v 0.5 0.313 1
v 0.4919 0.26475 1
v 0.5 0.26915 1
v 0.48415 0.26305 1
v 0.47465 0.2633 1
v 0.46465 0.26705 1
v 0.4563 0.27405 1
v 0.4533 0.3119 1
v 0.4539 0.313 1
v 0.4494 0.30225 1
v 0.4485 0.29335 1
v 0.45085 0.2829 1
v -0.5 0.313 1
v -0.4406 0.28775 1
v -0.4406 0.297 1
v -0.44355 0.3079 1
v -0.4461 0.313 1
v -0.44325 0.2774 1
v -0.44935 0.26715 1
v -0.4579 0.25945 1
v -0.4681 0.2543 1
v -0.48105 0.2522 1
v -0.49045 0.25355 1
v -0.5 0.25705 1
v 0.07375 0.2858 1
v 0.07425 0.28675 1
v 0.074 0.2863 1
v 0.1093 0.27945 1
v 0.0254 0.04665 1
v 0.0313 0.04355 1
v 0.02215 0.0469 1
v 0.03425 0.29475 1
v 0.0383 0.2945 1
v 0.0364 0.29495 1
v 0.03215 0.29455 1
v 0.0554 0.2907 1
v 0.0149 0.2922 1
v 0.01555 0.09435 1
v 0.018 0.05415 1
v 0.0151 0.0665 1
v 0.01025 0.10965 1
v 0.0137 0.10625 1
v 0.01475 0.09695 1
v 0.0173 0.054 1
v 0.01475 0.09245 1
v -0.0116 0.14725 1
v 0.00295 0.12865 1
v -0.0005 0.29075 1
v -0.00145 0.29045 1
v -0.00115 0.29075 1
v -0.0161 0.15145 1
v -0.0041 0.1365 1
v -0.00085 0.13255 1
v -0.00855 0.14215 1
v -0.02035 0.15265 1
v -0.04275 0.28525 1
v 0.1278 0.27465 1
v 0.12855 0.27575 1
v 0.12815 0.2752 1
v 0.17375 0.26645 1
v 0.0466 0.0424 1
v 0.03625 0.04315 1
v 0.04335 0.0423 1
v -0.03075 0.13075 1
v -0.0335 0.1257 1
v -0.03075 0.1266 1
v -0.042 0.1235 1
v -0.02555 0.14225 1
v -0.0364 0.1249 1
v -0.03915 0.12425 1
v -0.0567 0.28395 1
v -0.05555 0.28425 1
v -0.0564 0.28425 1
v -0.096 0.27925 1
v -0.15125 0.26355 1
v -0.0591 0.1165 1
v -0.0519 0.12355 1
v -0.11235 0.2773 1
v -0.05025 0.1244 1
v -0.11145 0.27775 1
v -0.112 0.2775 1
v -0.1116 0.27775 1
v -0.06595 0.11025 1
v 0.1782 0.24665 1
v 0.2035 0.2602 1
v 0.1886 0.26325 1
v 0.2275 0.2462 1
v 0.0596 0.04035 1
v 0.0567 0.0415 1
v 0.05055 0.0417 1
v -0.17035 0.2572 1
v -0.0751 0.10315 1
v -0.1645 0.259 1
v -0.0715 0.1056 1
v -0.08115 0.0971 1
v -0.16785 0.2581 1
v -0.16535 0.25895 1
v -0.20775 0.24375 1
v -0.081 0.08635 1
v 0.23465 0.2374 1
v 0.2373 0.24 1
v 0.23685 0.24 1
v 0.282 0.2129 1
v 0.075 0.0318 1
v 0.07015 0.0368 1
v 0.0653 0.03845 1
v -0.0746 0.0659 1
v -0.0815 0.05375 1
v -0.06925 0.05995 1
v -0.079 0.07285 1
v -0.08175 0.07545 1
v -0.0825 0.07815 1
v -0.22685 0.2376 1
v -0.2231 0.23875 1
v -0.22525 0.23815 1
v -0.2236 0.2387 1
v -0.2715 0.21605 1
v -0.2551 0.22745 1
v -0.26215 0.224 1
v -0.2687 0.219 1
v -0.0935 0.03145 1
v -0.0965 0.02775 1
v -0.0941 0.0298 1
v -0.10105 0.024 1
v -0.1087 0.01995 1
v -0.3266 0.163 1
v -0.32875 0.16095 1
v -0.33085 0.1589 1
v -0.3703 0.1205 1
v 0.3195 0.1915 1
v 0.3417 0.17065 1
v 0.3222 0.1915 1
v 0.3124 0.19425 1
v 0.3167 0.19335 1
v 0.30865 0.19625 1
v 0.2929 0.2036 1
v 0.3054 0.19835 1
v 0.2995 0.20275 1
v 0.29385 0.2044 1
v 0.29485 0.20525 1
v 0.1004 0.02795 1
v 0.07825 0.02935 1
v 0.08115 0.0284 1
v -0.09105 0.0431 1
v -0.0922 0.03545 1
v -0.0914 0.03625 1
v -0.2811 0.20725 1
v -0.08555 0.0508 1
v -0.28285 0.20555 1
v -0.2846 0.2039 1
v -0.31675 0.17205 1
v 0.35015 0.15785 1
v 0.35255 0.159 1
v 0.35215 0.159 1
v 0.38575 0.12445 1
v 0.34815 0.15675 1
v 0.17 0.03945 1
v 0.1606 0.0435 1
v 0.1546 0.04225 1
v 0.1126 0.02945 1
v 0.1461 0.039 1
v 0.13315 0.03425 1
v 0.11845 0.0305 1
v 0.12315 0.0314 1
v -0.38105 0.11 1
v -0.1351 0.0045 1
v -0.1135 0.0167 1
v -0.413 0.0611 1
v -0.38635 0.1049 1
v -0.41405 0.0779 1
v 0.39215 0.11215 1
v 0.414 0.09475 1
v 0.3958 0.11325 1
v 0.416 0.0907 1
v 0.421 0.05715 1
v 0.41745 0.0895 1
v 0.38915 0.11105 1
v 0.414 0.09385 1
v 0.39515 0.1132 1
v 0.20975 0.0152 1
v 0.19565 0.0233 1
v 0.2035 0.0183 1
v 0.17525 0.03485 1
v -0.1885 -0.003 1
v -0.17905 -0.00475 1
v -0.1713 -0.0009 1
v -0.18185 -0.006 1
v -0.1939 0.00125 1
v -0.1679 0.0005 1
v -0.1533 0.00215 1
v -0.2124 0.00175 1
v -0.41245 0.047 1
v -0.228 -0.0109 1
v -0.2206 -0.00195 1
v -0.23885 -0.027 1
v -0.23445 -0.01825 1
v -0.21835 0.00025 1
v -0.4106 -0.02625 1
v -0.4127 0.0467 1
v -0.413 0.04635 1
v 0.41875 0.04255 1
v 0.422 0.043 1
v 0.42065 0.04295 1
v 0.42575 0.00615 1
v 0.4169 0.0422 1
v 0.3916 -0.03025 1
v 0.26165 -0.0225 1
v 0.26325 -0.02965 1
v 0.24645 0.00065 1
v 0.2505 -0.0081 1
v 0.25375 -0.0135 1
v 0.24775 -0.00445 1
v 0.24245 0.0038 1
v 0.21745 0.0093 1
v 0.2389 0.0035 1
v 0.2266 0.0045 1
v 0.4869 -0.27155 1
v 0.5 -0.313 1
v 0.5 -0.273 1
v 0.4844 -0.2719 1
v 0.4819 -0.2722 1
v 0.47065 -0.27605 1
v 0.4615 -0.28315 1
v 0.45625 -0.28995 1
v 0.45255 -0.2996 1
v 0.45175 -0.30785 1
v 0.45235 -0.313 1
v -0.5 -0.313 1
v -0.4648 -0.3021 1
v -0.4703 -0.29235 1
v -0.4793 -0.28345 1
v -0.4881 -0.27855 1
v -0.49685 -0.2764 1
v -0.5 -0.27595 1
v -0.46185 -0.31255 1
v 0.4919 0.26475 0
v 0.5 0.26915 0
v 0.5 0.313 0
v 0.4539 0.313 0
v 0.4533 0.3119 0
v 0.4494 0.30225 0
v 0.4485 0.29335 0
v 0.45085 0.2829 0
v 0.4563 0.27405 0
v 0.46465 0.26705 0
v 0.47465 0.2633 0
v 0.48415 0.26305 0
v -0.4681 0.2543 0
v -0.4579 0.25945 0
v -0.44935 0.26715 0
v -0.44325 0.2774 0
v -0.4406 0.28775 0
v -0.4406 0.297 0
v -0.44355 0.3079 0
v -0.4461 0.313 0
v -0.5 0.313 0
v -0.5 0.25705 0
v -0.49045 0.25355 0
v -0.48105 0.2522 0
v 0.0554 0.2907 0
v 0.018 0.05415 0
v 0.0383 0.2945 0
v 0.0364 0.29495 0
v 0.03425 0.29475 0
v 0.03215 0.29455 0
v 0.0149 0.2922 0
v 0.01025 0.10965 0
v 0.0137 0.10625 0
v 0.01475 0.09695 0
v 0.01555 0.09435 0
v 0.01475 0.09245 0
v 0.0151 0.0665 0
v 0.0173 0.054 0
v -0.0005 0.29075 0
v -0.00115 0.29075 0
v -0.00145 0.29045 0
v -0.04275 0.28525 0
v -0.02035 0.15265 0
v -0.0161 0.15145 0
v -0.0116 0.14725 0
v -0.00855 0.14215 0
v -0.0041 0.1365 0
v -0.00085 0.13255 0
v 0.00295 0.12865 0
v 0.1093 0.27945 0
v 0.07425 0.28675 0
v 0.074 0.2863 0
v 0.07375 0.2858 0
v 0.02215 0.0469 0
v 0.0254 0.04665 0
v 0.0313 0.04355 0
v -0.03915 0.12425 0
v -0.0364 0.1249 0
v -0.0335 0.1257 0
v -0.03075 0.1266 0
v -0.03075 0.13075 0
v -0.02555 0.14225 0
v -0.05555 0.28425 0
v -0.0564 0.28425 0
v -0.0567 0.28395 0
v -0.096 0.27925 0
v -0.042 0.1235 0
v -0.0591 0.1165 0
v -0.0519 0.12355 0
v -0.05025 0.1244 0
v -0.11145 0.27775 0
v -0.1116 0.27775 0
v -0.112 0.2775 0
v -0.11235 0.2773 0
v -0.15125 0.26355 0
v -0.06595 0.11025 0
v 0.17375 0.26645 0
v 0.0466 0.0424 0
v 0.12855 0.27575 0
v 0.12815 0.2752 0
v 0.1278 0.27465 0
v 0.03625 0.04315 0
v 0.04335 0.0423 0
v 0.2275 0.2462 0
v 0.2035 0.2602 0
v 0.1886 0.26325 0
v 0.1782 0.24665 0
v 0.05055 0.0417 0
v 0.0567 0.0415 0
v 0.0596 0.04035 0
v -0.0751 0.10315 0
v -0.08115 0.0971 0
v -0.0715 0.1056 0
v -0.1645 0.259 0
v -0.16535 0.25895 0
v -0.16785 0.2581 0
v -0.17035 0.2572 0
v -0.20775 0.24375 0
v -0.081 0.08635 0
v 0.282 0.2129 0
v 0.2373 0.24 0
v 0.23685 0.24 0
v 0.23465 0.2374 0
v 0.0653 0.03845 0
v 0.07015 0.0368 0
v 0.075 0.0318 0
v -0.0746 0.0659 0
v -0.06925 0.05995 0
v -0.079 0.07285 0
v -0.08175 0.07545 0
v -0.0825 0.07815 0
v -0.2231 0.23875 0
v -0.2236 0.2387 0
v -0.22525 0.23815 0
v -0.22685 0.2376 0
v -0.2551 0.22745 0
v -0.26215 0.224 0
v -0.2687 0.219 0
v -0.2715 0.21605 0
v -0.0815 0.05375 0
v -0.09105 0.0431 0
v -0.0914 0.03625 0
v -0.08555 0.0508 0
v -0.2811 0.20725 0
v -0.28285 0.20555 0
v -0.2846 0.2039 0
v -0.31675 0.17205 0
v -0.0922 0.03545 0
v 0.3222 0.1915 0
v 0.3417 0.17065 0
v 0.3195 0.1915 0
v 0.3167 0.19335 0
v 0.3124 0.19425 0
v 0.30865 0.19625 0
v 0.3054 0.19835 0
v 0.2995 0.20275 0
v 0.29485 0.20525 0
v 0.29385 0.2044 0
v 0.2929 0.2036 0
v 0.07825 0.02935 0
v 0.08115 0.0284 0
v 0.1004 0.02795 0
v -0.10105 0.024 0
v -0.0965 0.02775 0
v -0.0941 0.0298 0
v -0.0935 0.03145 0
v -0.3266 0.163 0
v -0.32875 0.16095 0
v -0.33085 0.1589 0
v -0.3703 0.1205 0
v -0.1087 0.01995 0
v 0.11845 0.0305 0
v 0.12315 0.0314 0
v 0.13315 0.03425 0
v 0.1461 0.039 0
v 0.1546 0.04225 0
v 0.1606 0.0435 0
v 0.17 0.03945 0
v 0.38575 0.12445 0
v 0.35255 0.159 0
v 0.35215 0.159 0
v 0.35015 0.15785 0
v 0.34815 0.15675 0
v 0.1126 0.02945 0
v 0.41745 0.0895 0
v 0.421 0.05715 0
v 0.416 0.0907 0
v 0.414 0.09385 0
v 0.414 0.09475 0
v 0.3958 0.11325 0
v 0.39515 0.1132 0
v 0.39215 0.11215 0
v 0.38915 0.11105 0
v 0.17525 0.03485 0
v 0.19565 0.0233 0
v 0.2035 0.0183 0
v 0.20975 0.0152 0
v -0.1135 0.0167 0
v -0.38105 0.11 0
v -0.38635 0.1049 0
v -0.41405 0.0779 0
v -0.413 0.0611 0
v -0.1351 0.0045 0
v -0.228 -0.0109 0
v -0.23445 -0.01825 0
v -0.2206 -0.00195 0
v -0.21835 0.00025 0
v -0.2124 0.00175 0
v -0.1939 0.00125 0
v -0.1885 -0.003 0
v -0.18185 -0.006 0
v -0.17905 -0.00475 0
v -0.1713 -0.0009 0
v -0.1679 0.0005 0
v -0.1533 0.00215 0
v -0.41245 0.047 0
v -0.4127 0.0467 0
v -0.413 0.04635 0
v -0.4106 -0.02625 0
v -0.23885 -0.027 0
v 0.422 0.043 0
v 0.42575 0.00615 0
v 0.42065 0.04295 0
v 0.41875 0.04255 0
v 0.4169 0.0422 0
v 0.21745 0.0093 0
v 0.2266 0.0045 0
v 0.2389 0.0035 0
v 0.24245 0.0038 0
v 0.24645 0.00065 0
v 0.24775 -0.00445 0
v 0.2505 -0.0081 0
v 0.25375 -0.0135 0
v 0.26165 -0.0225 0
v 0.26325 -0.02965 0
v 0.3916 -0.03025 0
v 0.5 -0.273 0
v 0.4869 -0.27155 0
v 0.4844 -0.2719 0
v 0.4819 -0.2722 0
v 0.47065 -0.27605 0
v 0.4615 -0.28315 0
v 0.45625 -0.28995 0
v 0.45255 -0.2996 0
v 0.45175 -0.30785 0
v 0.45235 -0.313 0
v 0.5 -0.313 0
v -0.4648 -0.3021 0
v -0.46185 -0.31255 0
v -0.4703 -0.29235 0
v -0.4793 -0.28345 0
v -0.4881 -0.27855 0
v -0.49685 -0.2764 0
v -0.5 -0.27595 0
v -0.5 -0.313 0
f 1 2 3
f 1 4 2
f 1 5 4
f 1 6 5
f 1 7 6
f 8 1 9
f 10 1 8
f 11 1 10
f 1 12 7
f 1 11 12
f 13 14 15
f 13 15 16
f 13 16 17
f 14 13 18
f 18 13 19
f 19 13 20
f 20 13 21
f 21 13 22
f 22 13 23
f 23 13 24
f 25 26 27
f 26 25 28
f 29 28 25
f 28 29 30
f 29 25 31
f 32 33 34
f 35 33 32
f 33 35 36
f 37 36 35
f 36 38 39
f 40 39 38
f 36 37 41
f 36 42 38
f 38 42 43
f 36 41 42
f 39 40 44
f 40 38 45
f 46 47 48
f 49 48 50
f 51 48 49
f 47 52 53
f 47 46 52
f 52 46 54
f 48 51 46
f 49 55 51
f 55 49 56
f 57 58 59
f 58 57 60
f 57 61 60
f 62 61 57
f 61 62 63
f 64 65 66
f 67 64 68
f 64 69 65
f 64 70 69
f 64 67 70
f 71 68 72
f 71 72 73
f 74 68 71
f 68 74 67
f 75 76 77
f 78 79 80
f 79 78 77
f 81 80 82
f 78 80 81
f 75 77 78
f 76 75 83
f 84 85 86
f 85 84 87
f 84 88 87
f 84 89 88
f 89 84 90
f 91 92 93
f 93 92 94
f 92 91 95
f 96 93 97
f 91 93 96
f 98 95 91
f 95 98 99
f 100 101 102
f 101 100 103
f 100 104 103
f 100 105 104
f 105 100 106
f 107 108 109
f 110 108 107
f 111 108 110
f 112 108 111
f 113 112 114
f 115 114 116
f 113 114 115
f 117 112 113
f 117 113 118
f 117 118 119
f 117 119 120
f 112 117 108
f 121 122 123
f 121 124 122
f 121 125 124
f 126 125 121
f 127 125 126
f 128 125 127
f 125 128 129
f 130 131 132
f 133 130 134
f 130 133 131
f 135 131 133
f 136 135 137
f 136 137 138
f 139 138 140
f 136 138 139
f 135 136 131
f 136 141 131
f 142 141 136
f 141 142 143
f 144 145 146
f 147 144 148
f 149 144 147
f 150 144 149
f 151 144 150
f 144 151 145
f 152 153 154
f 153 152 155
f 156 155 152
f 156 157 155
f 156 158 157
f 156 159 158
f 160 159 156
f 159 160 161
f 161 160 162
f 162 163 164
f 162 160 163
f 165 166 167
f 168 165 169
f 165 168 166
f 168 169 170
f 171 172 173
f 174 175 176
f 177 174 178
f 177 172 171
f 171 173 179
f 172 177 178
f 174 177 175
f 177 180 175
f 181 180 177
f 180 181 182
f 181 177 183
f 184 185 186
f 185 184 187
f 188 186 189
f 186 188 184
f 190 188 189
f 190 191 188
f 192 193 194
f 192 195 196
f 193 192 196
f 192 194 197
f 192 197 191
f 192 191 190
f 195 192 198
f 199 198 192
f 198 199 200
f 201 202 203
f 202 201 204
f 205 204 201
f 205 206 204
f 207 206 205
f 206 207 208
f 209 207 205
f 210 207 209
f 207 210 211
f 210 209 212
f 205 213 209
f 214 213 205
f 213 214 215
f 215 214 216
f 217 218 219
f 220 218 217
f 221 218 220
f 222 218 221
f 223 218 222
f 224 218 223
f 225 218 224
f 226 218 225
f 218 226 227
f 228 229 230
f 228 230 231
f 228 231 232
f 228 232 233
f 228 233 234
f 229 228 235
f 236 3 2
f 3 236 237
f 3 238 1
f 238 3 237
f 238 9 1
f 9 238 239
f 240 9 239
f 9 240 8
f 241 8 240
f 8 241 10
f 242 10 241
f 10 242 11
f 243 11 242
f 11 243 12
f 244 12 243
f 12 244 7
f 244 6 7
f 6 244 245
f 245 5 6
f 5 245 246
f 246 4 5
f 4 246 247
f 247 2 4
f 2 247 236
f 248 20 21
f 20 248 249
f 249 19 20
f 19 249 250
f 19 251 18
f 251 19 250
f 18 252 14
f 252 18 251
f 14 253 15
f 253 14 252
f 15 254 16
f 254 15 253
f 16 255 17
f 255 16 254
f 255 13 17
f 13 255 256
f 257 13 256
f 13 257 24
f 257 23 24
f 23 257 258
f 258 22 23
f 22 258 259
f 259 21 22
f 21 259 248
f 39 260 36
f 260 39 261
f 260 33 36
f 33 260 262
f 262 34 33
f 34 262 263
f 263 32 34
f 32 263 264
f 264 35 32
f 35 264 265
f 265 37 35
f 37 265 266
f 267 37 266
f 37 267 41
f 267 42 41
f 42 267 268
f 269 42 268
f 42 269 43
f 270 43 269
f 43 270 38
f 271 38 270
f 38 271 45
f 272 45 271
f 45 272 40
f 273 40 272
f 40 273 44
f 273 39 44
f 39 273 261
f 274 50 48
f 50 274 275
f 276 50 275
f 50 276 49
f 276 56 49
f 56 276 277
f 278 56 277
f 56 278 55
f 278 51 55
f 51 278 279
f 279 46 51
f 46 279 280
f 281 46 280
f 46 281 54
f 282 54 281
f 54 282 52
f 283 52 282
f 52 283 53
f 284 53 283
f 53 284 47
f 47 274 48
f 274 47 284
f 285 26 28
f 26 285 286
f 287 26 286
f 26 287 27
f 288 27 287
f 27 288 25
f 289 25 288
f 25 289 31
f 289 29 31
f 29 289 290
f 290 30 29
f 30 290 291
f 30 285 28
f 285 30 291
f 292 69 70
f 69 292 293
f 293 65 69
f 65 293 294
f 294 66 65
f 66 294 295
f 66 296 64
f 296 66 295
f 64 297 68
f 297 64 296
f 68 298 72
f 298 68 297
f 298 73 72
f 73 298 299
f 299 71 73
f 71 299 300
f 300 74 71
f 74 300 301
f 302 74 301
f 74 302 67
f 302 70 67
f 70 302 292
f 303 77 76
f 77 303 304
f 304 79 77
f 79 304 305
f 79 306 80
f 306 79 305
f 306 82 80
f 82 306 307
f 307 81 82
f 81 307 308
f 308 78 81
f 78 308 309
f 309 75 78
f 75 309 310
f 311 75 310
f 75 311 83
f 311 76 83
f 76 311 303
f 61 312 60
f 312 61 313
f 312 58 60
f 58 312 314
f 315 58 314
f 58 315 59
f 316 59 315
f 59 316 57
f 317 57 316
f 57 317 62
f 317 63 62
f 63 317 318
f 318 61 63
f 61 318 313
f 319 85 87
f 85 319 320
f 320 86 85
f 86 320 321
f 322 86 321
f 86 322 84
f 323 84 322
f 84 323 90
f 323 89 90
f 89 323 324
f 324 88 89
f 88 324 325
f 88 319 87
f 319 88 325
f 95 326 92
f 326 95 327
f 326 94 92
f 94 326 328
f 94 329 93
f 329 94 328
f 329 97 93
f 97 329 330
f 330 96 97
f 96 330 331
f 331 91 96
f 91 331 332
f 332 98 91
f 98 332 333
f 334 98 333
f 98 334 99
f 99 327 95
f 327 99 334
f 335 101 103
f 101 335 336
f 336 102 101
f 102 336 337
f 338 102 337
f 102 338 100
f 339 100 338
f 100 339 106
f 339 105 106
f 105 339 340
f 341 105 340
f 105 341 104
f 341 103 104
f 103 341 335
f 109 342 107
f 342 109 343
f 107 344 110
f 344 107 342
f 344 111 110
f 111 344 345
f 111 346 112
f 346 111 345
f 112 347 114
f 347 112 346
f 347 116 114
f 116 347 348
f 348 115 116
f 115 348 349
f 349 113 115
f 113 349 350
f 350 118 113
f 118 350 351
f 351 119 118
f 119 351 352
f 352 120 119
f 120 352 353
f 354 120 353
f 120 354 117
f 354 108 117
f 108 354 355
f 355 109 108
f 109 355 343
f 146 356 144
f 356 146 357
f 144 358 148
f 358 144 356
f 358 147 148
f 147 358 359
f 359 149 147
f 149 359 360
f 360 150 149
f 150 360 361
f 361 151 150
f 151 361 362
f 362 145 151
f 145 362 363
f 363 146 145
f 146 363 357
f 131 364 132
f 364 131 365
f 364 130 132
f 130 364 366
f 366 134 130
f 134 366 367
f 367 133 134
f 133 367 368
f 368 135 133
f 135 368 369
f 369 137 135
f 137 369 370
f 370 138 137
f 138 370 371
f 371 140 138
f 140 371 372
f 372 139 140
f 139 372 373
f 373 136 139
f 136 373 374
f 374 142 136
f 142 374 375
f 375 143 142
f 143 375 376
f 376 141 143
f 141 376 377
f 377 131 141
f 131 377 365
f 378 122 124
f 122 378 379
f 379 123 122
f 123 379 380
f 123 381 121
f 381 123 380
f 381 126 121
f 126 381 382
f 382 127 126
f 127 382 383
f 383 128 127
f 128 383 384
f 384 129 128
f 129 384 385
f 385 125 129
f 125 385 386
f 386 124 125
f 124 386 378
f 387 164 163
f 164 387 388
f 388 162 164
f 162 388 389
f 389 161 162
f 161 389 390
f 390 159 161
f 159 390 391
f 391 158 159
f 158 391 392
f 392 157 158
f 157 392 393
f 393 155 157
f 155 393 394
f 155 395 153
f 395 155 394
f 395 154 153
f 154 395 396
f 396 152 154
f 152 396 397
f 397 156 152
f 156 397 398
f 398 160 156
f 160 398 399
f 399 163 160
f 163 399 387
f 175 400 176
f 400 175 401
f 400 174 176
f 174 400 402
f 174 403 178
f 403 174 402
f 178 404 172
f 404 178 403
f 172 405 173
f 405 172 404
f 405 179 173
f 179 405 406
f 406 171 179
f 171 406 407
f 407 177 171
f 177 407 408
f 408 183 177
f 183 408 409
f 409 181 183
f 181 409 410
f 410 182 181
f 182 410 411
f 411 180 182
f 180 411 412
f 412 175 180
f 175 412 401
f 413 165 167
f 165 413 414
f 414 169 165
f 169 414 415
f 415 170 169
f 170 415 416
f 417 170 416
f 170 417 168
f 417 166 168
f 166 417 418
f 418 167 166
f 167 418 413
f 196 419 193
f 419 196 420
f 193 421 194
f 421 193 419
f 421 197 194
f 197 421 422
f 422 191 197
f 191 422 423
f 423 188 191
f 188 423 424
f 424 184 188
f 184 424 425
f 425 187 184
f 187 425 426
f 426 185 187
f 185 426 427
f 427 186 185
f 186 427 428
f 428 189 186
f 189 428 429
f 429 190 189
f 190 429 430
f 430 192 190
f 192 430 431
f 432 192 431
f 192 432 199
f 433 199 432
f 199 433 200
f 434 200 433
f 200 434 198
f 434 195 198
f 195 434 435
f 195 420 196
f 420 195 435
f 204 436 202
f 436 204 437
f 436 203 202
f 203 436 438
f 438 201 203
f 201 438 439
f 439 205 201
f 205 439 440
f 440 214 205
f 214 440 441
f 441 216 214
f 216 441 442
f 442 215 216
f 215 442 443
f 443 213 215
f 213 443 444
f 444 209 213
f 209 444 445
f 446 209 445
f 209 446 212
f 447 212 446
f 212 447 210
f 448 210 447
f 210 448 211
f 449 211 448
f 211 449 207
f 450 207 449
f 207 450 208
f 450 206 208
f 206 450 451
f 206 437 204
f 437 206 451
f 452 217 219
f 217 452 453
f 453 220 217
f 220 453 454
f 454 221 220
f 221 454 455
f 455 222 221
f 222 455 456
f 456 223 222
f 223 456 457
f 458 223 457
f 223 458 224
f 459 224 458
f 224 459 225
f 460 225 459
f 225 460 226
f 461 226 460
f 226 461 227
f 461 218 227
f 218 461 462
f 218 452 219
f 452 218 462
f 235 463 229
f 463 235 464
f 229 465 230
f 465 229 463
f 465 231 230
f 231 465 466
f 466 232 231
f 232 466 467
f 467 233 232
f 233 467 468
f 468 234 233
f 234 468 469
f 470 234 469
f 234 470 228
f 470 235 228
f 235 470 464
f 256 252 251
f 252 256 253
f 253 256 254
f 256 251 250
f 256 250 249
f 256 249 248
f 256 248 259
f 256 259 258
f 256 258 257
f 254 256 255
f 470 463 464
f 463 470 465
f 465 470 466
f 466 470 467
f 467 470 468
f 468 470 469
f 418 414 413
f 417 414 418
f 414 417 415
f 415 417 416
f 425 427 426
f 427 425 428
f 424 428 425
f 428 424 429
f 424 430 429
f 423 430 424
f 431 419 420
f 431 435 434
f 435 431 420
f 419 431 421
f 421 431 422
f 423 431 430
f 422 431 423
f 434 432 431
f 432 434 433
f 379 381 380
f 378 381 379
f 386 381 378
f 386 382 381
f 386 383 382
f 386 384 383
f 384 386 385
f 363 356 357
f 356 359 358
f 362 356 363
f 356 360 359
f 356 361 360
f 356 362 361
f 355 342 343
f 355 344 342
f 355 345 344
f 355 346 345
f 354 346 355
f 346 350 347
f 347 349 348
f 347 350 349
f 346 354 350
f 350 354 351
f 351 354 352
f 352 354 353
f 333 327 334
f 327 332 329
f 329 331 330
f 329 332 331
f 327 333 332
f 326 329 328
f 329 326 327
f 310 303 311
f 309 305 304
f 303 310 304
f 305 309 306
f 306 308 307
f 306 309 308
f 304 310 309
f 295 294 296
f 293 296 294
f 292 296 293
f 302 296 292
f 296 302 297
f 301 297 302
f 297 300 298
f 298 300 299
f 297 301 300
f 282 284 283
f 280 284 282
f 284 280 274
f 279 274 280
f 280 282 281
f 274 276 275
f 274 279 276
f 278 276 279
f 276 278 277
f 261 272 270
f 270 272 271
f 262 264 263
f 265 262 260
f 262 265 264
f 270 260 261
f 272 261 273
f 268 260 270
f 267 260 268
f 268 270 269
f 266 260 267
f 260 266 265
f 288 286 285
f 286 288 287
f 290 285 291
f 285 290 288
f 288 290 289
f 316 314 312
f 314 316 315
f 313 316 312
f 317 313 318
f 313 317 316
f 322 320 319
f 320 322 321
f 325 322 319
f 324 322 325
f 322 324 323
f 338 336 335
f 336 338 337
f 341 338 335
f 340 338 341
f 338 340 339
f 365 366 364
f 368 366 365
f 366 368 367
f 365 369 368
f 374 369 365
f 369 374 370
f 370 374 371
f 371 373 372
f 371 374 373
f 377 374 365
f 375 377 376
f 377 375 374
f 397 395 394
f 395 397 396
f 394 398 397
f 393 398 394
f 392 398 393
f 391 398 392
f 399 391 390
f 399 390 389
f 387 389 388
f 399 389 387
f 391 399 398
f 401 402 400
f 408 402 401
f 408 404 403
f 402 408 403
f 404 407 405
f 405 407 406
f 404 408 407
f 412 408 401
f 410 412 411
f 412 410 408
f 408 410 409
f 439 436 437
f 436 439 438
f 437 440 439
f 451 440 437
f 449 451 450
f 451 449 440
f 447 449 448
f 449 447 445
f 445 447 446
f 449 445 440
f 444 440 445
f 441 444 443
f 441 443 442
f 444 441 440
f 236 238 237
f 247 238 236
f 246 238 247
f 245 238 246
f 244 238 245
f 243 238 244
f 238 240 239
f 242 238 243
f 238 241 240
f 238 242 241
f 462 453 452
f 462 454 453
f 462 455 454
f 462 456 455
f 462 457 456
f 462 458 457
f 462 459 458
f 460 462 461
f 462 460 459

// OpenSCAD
module fan9red_1()
{
 /* Generated by trace2scad version 20150415
    http://aggregate.org/MAKE/TRACE2SCAD/
    Optimized model has 243/3466 original points
 */
  minx=0; /* polygon minx=0 */
  miny=0; /* polygon miny=0 */
  maxx=20000; /* polygon maxx=20000 */
  maxy=12520; /* polygon maxy=12520 */
  dx=maxx-minx;
  dy=maxy-miny;
  maxd=((dx>dy)?dx:dy);
 scale([1/maxd, 1/maxd, 1])
 translate([-minx-dx/2, -miny-dy/2, 0])
 linear_extrude(height=1, convexity=243)
 union() {
  union() {
   polygon([[0,11961],[0,11401],[191,11331],[379,11304],[638,11346],[842,11449],[1013,11603],[1135,11808],[1188,12015],[1188,12200],[1129,12418],[1078,12520],[0,12520]], convexity=5);
   polygon([[19072,12509],[19066,12498],[18988,12305],[18970,12127],[19017,11918],[19126,11741],[19293,11601],[19493,11526],[19683,11521],[19838,11555],[20000,11643],[20000,12520],[19078,12520]], convexity=6);
   polygon([[10685,12155],[10643,12151],[10298,12104],[10205,8453],[10274,8385],[10295,8199],[10311,8147],[10295,8109],[10302,7590],[10346,7340],[10360,7343],[11108,12074],[10766,12150],[10728,12159]], convexity=8);
   polygon([[9974,12072],[9971,12069],[9145,11965],[9593,9313],[9678,9289],[9768,9205],[9829,9103],[9918,8990],[9983,8911],[10059,8833],[9990,12075],[9977,12075]], convexity=5);
   polygon([[11480,11986],[11475,11976],[10443,7198],[10508,7193],[10626,7131],[12186,11849],[11485,11995]], convexity=6);
   polygon([[8869,11942],[8866,11939],[8080,11845],[9160,8730],[9217,8745],[9272,8758],[9330,8774],[9385,8792],[9385,8875],[9489,9105],[8889,11945],[8872,11945]], convexity=6);
   polygon([[7760,11810],[7753,11806],[6975,11531],[8681,8465],[8818,8590],[8962,8731],[8995,8748],[7771,11815],[7768,11815]], convexity=6);
   polygon([[12563,11764],[12556,11753],[10725,7123],[10867,7106],[10932,7108],[13475,11589],[12571,11775]], convexity=6);
   polygon([[13668,11359],[13564,11193],[11011,7094],[11134,7090],[11192,7067],[14550,11184],[14070,11464],[13772,11525]], convexity=6);
   polygon([[6643,11422],[6593,11404],[5845,11135],[8380,7987],[8377,8202],[8498,8323],[8570,8372],[6710,11440],[6693,11439]], convexity=8);
   polygon([[14715,11034],[14693,11008],[11306,7029],[11403,6996],[11500,6896],[15640,10518],[14746,11060],[14737,11060]], convexity=6);
   polygon([[5495,11023],[5463,11012],[4898,10809],[4757,10740],[4626,10640],[4570,10581],[8370,7335],[8615,7459],[8508,7578],[8420,7717],[8365,7769],[8350,7823],[5538,11035],[5528,11034]], convexity=7);
   polygon([[4343,10371],[4308,10338],[3665,9701],[8156,6969],[8172,6985],[8179,7122],[8289,7276],[4378,10405]], convexity=6);
   polygon([[15877,10348],[15858,10332],[11565,6847],[11623,6828],[12008,6819],[16834,9673],[16444,10090],[16390,10090],[16334,10127],[16248,10145],[16173,10185],[16108,10227],[15990,10315],[15897,10365]], convexity=6);
   polygon([[3425,9479],[3383,9438],[2594,8670],[7826,6659],[7979,6740],[8070,6815],[8118,6856],[8130,6889],[3468,9520]], convexity=6);
   polygon([[17003,9417],[16963,9395],[12252,6849],[12369,6870],[12463,6888],[12663,6945],[12922,7040],[13092,7105],[13212,7130],[13400,7049],[17715,8749],[17051,9440],[17043,9440]], convexity=7);
   polygon([[17843,8503],[17783,8481],[13505,6957],[13913,6726],[14070,6626],[14195,6564],[18420,7403],[18349,8050],[18320,8074],[18280,8137],[18280,8155],[17916,8525],[17903,8524]], convexity=9);
   polygon([[2326,8409],[2273,8358],[1719,7818],[1740,7482],[7298,6350],[7730,6594],[2379,8460]], convexity=6);
   polygon([[1746,7194],[1740,7187],[1788,5735],[5223,5720],[5311,5895],[5440,6042],[5588,6221],[5633,6265],[5752,6295],[6122,6285],[6230,6200],[6363,6140],[6419,6165],[6574,6242],[6642,6270],[6934,6303],[1751,7200]], convexity=8);
   polygon([[18375,7111],[18338,7104],[14349,6446],[14532,6350],[14778,6330],[14849,6336],[14929,6273],[14955,6171],[15010,6098],[15075,5990],[15233,5810],[15265,5667],[17832,5655],[18515,6383],[18440,7120],[18413,7119]], convexity=9);
   polygon([[19688,822],[19638,816],[19413,739],[19230,597],[19125,461],[19051,268],[19035,103],[19047,0],[20000,0],[20000,800],[19738,829]], convexity=6);
   polygon([[0,371],[0,0],[763,9],[704,218],[594,413],[414,591],[238,689],[63,732],[0,741]], convexity=5);
  }
 }
}

module fan9red()
{
 /* all layers combined, scaled to within a 1mm cube */
 scale([1, 1, 1/1])
 difference() {
  union() {
   scale([1,1,2]) translate([0,0,-0.5]) fan9red_1();
  }
  translate([0,0,-2]) cube([2,2,4],center=true);
 }
}
fan9red();
